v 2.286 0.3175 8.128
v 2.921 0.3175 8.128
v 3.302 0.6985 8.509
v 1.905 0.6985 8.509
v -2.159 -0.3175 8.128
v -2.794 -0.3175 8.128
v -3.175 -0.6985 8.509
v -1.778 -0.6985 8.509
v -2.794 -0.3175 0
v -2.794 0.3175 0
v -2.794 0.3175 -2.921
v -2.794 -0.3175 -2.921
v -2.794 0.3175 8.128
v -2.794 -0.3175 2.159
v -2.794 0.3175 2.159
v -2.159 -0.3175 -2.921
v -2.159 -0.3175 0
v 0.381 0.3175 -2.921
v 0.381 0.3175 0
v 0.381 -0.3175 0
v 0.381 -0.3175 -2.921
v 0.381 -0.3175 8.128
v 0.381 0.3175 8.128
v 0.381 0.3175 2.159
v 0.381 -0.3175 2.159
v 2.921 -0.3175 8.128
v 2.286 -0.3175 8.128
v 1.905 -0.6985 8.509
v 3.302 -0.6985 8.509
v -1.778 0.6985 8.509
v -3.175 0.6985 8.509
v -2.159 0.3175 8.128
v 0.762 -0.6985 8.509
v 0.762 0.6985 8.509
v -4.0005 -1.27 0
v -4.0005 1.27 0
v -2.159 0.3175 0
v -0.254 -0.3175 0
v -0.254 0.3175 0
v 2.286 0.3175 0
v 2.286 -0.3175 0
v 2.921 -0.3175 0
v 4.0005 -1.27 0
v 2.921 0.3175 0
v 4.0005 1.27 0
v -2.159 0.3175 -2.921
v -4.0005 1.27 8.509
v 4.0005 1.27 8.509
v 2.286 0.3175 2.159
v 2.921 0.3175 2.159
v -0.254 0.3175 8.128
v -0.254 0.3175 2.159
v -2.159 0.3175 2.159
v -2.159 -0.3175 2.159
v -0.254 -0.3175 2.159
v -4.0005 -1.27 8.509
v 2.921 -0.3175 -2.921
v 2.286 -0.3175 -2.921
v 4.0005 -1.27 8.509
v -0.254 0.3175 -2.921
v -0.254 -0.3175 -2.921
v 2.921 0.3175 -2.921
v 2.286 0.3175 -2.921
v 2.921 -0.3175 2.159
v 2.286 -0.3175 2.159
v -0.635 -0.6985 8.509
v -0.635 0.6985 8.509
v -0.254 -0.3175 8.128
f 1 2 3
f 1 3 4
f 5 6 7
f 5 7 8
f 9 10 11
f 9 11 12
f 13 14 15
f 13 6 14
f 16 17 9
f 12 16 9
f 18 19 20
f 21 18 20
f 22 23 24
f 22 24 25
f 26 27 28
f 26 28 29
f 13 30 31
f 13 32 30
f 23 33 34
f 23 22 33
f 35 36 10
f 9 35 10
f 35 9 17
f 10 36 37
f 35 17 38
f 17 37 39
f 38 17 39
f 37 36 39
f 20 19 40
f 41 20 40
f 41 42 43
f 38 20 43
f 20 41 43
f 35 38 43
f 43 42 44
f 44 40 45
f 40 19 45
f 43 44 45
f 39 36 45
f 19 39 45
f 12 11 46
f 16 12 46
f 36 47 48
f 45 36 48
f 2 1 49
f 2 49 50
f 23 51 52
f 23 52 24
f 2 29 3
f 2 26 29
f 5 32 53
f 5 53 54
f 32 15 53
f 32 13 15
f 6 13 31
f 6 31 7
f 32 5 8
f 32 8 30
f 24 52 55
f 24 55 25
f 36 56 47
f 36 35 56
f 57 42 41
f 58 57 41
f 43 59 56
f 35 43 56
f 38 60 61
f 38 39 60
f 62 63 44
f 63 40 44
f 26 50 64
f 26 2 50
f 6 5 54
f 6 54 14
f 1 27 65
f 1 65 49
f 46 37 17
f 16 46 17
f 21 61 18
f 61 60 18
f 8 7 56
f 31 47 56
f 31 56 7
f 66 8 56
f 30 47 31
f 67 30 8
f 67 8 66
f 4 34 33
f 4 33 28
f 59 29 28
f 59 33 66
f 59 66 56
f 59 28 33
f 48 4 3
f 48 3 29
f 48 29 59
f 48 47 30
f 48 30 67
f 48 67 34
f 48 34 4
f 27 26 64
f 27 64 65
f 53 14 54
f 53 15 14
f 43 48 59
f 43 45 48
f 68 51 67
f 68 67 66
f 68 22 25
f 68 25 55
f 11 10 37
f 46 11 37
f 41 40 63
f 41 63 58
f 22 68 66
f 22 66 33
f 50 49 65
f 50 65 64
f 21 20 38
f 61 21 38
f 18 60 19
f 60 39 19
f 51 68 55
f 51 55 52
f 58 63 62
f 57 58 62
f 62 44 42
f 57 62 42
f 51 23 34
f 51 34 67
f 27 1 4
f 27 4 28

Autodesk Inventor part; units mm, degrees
ref_plane "YZ Plane" through (0, 0, 0) normal (1, 0, 0) x (0, 1, 0)
ref_plane "XZ Plane" through (0, 0, 0) normal (0, 1, 0) x (-1, 0, 0)
ref_plane "XY Plane" through (0, 0, 0) normal (0, 0, 1) x (1, 0, 0)
sketch "Sketch1" plane through (0, 0, 0) normal (0, 0, 1) x (1, 0, 0)
  line L0 (-4.0005, 1.27) -> (4.0005, 1.27)
  line L1 (4.0005, 1.27) -> (4.0005, -1.27)
  line L2 (4.0005, -1.27) -> (-4.0005, -1.27)
  line L3 (-4.0005, -1.27) -> (-4.0005, 1.27)
  line L4 (0, 0) -> (-4.0005, 0) construction
  line L5 (0, 0) -> (0, -1.27) construction
  line L6 (0, 0) -> (0, 1.27) construction
  line L7 (0, 0) -> (4.0005, 0) construction
  dimension "d0" = 8.001
  dimension "d1" = 2.54
extrude "Extrusion1" add sketch "Sketch1" along normal blind 8.509
sketch "Sketch2" plane through (0, 0, 8.509) normal (0, 0, 1) x (1, 0, 0)
  line L0 (-4.0005, 1.27) -> (4.0005, 1.27) projected
  line L1 (-4.0005, -1.27) -> (-4.0005, 1.27) projected
  line L2 (-2.794, 0.3175) -> (-2.159, 0.3175)
  line L3 (-2.159, 0.3175) -> (-2.159, -0.3175)
  line L4 (-2.159, -0.3175) -> (-2.794, -0.3175)
  line L5 (-2.794, -0.3175) -> (-2.794, 0.3175)
  dimension "d4" = 0.635
  dimension "d5" = 1.2065
  dimension "d6" = 0.9525
extrude "Extrusion2" cut sketch "Sketch2" against normal blind 6.35
chamfer "Chamfer1" distance 0.381 angle 45 4 edges at (-2.4765, 0.3175, 8.509) (-2.159, 0, 8.509) (-2.4765, -0.3175, 8.509) (-2.794, 0, 8.509)
sketch "Sketch3" plane through (0, 0, 2.159) normal (0, 0, 1) x (1, 0, 0)
  line L0 (-2.794, 0.3175) -> (-2.794, -0.3175) projected
  line L1 (-2.794, -0.3175) -> (-2.794, 0.3175) projected
  line L2 (-2.794, 0.3175) -> (-2.159, 0.3175) projected
  line L3 (-2.159, 0.3175) -> (-2.159, -0.3175) projected
  line L4 (-2.159, -0.3175) -> (-2.794, -0.3175) projected
extrude "Extrusion3" add sketch "Sketch3" against normal blind 5.08
pattern_linear "Rectangular Pattern3" count 3 spacing 2.54 along (1, 0, 0) of "Extrusion2", "Chamfer1"
pattern_linear "Rectangular Pattern4" count 3 spacing 2.54 along (1, 0, 0) of "Extrusion3"
properties part number "1x3 Header Connector" material "ABS Plastic"
